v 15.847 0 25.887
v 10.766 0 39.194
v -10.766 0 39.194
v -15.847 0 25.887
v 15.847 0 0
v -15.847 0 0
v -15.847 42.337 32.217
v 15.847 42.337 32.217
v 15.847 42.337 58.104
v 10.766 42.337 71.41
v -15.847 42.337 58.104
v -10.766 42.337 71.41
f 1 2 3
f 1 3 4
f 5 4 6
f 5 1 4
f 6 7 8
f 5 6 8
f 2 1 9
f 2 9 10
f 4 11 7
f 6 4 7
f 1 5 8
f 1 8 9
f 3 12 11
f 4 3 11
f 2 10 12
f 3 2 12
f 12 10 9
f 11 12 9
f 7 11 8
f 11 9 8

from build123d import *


with BuildPart() as f2:
    # F2: sweep along a path in F1
    with BuildLine(Plane.YZ) as f2_path:
        Line((0, 0), (42.337261, 32.216601))
    # F0 (on Front) → F2 (sweep)
    with BuildSketch(Plane.XZ):
        Polygon((-15.846774, 0), (0, 0), (15.846774, 0), (15.846774, 25.887098), (10.766129, 39.193552), (3.750001, 39.193552), (-3.750001, 39.193552), (-10.766129, 39.193552), (-15.846774, 25.887098), align=None)
    sweep(path=f2_path.line)


solid = f2.part
